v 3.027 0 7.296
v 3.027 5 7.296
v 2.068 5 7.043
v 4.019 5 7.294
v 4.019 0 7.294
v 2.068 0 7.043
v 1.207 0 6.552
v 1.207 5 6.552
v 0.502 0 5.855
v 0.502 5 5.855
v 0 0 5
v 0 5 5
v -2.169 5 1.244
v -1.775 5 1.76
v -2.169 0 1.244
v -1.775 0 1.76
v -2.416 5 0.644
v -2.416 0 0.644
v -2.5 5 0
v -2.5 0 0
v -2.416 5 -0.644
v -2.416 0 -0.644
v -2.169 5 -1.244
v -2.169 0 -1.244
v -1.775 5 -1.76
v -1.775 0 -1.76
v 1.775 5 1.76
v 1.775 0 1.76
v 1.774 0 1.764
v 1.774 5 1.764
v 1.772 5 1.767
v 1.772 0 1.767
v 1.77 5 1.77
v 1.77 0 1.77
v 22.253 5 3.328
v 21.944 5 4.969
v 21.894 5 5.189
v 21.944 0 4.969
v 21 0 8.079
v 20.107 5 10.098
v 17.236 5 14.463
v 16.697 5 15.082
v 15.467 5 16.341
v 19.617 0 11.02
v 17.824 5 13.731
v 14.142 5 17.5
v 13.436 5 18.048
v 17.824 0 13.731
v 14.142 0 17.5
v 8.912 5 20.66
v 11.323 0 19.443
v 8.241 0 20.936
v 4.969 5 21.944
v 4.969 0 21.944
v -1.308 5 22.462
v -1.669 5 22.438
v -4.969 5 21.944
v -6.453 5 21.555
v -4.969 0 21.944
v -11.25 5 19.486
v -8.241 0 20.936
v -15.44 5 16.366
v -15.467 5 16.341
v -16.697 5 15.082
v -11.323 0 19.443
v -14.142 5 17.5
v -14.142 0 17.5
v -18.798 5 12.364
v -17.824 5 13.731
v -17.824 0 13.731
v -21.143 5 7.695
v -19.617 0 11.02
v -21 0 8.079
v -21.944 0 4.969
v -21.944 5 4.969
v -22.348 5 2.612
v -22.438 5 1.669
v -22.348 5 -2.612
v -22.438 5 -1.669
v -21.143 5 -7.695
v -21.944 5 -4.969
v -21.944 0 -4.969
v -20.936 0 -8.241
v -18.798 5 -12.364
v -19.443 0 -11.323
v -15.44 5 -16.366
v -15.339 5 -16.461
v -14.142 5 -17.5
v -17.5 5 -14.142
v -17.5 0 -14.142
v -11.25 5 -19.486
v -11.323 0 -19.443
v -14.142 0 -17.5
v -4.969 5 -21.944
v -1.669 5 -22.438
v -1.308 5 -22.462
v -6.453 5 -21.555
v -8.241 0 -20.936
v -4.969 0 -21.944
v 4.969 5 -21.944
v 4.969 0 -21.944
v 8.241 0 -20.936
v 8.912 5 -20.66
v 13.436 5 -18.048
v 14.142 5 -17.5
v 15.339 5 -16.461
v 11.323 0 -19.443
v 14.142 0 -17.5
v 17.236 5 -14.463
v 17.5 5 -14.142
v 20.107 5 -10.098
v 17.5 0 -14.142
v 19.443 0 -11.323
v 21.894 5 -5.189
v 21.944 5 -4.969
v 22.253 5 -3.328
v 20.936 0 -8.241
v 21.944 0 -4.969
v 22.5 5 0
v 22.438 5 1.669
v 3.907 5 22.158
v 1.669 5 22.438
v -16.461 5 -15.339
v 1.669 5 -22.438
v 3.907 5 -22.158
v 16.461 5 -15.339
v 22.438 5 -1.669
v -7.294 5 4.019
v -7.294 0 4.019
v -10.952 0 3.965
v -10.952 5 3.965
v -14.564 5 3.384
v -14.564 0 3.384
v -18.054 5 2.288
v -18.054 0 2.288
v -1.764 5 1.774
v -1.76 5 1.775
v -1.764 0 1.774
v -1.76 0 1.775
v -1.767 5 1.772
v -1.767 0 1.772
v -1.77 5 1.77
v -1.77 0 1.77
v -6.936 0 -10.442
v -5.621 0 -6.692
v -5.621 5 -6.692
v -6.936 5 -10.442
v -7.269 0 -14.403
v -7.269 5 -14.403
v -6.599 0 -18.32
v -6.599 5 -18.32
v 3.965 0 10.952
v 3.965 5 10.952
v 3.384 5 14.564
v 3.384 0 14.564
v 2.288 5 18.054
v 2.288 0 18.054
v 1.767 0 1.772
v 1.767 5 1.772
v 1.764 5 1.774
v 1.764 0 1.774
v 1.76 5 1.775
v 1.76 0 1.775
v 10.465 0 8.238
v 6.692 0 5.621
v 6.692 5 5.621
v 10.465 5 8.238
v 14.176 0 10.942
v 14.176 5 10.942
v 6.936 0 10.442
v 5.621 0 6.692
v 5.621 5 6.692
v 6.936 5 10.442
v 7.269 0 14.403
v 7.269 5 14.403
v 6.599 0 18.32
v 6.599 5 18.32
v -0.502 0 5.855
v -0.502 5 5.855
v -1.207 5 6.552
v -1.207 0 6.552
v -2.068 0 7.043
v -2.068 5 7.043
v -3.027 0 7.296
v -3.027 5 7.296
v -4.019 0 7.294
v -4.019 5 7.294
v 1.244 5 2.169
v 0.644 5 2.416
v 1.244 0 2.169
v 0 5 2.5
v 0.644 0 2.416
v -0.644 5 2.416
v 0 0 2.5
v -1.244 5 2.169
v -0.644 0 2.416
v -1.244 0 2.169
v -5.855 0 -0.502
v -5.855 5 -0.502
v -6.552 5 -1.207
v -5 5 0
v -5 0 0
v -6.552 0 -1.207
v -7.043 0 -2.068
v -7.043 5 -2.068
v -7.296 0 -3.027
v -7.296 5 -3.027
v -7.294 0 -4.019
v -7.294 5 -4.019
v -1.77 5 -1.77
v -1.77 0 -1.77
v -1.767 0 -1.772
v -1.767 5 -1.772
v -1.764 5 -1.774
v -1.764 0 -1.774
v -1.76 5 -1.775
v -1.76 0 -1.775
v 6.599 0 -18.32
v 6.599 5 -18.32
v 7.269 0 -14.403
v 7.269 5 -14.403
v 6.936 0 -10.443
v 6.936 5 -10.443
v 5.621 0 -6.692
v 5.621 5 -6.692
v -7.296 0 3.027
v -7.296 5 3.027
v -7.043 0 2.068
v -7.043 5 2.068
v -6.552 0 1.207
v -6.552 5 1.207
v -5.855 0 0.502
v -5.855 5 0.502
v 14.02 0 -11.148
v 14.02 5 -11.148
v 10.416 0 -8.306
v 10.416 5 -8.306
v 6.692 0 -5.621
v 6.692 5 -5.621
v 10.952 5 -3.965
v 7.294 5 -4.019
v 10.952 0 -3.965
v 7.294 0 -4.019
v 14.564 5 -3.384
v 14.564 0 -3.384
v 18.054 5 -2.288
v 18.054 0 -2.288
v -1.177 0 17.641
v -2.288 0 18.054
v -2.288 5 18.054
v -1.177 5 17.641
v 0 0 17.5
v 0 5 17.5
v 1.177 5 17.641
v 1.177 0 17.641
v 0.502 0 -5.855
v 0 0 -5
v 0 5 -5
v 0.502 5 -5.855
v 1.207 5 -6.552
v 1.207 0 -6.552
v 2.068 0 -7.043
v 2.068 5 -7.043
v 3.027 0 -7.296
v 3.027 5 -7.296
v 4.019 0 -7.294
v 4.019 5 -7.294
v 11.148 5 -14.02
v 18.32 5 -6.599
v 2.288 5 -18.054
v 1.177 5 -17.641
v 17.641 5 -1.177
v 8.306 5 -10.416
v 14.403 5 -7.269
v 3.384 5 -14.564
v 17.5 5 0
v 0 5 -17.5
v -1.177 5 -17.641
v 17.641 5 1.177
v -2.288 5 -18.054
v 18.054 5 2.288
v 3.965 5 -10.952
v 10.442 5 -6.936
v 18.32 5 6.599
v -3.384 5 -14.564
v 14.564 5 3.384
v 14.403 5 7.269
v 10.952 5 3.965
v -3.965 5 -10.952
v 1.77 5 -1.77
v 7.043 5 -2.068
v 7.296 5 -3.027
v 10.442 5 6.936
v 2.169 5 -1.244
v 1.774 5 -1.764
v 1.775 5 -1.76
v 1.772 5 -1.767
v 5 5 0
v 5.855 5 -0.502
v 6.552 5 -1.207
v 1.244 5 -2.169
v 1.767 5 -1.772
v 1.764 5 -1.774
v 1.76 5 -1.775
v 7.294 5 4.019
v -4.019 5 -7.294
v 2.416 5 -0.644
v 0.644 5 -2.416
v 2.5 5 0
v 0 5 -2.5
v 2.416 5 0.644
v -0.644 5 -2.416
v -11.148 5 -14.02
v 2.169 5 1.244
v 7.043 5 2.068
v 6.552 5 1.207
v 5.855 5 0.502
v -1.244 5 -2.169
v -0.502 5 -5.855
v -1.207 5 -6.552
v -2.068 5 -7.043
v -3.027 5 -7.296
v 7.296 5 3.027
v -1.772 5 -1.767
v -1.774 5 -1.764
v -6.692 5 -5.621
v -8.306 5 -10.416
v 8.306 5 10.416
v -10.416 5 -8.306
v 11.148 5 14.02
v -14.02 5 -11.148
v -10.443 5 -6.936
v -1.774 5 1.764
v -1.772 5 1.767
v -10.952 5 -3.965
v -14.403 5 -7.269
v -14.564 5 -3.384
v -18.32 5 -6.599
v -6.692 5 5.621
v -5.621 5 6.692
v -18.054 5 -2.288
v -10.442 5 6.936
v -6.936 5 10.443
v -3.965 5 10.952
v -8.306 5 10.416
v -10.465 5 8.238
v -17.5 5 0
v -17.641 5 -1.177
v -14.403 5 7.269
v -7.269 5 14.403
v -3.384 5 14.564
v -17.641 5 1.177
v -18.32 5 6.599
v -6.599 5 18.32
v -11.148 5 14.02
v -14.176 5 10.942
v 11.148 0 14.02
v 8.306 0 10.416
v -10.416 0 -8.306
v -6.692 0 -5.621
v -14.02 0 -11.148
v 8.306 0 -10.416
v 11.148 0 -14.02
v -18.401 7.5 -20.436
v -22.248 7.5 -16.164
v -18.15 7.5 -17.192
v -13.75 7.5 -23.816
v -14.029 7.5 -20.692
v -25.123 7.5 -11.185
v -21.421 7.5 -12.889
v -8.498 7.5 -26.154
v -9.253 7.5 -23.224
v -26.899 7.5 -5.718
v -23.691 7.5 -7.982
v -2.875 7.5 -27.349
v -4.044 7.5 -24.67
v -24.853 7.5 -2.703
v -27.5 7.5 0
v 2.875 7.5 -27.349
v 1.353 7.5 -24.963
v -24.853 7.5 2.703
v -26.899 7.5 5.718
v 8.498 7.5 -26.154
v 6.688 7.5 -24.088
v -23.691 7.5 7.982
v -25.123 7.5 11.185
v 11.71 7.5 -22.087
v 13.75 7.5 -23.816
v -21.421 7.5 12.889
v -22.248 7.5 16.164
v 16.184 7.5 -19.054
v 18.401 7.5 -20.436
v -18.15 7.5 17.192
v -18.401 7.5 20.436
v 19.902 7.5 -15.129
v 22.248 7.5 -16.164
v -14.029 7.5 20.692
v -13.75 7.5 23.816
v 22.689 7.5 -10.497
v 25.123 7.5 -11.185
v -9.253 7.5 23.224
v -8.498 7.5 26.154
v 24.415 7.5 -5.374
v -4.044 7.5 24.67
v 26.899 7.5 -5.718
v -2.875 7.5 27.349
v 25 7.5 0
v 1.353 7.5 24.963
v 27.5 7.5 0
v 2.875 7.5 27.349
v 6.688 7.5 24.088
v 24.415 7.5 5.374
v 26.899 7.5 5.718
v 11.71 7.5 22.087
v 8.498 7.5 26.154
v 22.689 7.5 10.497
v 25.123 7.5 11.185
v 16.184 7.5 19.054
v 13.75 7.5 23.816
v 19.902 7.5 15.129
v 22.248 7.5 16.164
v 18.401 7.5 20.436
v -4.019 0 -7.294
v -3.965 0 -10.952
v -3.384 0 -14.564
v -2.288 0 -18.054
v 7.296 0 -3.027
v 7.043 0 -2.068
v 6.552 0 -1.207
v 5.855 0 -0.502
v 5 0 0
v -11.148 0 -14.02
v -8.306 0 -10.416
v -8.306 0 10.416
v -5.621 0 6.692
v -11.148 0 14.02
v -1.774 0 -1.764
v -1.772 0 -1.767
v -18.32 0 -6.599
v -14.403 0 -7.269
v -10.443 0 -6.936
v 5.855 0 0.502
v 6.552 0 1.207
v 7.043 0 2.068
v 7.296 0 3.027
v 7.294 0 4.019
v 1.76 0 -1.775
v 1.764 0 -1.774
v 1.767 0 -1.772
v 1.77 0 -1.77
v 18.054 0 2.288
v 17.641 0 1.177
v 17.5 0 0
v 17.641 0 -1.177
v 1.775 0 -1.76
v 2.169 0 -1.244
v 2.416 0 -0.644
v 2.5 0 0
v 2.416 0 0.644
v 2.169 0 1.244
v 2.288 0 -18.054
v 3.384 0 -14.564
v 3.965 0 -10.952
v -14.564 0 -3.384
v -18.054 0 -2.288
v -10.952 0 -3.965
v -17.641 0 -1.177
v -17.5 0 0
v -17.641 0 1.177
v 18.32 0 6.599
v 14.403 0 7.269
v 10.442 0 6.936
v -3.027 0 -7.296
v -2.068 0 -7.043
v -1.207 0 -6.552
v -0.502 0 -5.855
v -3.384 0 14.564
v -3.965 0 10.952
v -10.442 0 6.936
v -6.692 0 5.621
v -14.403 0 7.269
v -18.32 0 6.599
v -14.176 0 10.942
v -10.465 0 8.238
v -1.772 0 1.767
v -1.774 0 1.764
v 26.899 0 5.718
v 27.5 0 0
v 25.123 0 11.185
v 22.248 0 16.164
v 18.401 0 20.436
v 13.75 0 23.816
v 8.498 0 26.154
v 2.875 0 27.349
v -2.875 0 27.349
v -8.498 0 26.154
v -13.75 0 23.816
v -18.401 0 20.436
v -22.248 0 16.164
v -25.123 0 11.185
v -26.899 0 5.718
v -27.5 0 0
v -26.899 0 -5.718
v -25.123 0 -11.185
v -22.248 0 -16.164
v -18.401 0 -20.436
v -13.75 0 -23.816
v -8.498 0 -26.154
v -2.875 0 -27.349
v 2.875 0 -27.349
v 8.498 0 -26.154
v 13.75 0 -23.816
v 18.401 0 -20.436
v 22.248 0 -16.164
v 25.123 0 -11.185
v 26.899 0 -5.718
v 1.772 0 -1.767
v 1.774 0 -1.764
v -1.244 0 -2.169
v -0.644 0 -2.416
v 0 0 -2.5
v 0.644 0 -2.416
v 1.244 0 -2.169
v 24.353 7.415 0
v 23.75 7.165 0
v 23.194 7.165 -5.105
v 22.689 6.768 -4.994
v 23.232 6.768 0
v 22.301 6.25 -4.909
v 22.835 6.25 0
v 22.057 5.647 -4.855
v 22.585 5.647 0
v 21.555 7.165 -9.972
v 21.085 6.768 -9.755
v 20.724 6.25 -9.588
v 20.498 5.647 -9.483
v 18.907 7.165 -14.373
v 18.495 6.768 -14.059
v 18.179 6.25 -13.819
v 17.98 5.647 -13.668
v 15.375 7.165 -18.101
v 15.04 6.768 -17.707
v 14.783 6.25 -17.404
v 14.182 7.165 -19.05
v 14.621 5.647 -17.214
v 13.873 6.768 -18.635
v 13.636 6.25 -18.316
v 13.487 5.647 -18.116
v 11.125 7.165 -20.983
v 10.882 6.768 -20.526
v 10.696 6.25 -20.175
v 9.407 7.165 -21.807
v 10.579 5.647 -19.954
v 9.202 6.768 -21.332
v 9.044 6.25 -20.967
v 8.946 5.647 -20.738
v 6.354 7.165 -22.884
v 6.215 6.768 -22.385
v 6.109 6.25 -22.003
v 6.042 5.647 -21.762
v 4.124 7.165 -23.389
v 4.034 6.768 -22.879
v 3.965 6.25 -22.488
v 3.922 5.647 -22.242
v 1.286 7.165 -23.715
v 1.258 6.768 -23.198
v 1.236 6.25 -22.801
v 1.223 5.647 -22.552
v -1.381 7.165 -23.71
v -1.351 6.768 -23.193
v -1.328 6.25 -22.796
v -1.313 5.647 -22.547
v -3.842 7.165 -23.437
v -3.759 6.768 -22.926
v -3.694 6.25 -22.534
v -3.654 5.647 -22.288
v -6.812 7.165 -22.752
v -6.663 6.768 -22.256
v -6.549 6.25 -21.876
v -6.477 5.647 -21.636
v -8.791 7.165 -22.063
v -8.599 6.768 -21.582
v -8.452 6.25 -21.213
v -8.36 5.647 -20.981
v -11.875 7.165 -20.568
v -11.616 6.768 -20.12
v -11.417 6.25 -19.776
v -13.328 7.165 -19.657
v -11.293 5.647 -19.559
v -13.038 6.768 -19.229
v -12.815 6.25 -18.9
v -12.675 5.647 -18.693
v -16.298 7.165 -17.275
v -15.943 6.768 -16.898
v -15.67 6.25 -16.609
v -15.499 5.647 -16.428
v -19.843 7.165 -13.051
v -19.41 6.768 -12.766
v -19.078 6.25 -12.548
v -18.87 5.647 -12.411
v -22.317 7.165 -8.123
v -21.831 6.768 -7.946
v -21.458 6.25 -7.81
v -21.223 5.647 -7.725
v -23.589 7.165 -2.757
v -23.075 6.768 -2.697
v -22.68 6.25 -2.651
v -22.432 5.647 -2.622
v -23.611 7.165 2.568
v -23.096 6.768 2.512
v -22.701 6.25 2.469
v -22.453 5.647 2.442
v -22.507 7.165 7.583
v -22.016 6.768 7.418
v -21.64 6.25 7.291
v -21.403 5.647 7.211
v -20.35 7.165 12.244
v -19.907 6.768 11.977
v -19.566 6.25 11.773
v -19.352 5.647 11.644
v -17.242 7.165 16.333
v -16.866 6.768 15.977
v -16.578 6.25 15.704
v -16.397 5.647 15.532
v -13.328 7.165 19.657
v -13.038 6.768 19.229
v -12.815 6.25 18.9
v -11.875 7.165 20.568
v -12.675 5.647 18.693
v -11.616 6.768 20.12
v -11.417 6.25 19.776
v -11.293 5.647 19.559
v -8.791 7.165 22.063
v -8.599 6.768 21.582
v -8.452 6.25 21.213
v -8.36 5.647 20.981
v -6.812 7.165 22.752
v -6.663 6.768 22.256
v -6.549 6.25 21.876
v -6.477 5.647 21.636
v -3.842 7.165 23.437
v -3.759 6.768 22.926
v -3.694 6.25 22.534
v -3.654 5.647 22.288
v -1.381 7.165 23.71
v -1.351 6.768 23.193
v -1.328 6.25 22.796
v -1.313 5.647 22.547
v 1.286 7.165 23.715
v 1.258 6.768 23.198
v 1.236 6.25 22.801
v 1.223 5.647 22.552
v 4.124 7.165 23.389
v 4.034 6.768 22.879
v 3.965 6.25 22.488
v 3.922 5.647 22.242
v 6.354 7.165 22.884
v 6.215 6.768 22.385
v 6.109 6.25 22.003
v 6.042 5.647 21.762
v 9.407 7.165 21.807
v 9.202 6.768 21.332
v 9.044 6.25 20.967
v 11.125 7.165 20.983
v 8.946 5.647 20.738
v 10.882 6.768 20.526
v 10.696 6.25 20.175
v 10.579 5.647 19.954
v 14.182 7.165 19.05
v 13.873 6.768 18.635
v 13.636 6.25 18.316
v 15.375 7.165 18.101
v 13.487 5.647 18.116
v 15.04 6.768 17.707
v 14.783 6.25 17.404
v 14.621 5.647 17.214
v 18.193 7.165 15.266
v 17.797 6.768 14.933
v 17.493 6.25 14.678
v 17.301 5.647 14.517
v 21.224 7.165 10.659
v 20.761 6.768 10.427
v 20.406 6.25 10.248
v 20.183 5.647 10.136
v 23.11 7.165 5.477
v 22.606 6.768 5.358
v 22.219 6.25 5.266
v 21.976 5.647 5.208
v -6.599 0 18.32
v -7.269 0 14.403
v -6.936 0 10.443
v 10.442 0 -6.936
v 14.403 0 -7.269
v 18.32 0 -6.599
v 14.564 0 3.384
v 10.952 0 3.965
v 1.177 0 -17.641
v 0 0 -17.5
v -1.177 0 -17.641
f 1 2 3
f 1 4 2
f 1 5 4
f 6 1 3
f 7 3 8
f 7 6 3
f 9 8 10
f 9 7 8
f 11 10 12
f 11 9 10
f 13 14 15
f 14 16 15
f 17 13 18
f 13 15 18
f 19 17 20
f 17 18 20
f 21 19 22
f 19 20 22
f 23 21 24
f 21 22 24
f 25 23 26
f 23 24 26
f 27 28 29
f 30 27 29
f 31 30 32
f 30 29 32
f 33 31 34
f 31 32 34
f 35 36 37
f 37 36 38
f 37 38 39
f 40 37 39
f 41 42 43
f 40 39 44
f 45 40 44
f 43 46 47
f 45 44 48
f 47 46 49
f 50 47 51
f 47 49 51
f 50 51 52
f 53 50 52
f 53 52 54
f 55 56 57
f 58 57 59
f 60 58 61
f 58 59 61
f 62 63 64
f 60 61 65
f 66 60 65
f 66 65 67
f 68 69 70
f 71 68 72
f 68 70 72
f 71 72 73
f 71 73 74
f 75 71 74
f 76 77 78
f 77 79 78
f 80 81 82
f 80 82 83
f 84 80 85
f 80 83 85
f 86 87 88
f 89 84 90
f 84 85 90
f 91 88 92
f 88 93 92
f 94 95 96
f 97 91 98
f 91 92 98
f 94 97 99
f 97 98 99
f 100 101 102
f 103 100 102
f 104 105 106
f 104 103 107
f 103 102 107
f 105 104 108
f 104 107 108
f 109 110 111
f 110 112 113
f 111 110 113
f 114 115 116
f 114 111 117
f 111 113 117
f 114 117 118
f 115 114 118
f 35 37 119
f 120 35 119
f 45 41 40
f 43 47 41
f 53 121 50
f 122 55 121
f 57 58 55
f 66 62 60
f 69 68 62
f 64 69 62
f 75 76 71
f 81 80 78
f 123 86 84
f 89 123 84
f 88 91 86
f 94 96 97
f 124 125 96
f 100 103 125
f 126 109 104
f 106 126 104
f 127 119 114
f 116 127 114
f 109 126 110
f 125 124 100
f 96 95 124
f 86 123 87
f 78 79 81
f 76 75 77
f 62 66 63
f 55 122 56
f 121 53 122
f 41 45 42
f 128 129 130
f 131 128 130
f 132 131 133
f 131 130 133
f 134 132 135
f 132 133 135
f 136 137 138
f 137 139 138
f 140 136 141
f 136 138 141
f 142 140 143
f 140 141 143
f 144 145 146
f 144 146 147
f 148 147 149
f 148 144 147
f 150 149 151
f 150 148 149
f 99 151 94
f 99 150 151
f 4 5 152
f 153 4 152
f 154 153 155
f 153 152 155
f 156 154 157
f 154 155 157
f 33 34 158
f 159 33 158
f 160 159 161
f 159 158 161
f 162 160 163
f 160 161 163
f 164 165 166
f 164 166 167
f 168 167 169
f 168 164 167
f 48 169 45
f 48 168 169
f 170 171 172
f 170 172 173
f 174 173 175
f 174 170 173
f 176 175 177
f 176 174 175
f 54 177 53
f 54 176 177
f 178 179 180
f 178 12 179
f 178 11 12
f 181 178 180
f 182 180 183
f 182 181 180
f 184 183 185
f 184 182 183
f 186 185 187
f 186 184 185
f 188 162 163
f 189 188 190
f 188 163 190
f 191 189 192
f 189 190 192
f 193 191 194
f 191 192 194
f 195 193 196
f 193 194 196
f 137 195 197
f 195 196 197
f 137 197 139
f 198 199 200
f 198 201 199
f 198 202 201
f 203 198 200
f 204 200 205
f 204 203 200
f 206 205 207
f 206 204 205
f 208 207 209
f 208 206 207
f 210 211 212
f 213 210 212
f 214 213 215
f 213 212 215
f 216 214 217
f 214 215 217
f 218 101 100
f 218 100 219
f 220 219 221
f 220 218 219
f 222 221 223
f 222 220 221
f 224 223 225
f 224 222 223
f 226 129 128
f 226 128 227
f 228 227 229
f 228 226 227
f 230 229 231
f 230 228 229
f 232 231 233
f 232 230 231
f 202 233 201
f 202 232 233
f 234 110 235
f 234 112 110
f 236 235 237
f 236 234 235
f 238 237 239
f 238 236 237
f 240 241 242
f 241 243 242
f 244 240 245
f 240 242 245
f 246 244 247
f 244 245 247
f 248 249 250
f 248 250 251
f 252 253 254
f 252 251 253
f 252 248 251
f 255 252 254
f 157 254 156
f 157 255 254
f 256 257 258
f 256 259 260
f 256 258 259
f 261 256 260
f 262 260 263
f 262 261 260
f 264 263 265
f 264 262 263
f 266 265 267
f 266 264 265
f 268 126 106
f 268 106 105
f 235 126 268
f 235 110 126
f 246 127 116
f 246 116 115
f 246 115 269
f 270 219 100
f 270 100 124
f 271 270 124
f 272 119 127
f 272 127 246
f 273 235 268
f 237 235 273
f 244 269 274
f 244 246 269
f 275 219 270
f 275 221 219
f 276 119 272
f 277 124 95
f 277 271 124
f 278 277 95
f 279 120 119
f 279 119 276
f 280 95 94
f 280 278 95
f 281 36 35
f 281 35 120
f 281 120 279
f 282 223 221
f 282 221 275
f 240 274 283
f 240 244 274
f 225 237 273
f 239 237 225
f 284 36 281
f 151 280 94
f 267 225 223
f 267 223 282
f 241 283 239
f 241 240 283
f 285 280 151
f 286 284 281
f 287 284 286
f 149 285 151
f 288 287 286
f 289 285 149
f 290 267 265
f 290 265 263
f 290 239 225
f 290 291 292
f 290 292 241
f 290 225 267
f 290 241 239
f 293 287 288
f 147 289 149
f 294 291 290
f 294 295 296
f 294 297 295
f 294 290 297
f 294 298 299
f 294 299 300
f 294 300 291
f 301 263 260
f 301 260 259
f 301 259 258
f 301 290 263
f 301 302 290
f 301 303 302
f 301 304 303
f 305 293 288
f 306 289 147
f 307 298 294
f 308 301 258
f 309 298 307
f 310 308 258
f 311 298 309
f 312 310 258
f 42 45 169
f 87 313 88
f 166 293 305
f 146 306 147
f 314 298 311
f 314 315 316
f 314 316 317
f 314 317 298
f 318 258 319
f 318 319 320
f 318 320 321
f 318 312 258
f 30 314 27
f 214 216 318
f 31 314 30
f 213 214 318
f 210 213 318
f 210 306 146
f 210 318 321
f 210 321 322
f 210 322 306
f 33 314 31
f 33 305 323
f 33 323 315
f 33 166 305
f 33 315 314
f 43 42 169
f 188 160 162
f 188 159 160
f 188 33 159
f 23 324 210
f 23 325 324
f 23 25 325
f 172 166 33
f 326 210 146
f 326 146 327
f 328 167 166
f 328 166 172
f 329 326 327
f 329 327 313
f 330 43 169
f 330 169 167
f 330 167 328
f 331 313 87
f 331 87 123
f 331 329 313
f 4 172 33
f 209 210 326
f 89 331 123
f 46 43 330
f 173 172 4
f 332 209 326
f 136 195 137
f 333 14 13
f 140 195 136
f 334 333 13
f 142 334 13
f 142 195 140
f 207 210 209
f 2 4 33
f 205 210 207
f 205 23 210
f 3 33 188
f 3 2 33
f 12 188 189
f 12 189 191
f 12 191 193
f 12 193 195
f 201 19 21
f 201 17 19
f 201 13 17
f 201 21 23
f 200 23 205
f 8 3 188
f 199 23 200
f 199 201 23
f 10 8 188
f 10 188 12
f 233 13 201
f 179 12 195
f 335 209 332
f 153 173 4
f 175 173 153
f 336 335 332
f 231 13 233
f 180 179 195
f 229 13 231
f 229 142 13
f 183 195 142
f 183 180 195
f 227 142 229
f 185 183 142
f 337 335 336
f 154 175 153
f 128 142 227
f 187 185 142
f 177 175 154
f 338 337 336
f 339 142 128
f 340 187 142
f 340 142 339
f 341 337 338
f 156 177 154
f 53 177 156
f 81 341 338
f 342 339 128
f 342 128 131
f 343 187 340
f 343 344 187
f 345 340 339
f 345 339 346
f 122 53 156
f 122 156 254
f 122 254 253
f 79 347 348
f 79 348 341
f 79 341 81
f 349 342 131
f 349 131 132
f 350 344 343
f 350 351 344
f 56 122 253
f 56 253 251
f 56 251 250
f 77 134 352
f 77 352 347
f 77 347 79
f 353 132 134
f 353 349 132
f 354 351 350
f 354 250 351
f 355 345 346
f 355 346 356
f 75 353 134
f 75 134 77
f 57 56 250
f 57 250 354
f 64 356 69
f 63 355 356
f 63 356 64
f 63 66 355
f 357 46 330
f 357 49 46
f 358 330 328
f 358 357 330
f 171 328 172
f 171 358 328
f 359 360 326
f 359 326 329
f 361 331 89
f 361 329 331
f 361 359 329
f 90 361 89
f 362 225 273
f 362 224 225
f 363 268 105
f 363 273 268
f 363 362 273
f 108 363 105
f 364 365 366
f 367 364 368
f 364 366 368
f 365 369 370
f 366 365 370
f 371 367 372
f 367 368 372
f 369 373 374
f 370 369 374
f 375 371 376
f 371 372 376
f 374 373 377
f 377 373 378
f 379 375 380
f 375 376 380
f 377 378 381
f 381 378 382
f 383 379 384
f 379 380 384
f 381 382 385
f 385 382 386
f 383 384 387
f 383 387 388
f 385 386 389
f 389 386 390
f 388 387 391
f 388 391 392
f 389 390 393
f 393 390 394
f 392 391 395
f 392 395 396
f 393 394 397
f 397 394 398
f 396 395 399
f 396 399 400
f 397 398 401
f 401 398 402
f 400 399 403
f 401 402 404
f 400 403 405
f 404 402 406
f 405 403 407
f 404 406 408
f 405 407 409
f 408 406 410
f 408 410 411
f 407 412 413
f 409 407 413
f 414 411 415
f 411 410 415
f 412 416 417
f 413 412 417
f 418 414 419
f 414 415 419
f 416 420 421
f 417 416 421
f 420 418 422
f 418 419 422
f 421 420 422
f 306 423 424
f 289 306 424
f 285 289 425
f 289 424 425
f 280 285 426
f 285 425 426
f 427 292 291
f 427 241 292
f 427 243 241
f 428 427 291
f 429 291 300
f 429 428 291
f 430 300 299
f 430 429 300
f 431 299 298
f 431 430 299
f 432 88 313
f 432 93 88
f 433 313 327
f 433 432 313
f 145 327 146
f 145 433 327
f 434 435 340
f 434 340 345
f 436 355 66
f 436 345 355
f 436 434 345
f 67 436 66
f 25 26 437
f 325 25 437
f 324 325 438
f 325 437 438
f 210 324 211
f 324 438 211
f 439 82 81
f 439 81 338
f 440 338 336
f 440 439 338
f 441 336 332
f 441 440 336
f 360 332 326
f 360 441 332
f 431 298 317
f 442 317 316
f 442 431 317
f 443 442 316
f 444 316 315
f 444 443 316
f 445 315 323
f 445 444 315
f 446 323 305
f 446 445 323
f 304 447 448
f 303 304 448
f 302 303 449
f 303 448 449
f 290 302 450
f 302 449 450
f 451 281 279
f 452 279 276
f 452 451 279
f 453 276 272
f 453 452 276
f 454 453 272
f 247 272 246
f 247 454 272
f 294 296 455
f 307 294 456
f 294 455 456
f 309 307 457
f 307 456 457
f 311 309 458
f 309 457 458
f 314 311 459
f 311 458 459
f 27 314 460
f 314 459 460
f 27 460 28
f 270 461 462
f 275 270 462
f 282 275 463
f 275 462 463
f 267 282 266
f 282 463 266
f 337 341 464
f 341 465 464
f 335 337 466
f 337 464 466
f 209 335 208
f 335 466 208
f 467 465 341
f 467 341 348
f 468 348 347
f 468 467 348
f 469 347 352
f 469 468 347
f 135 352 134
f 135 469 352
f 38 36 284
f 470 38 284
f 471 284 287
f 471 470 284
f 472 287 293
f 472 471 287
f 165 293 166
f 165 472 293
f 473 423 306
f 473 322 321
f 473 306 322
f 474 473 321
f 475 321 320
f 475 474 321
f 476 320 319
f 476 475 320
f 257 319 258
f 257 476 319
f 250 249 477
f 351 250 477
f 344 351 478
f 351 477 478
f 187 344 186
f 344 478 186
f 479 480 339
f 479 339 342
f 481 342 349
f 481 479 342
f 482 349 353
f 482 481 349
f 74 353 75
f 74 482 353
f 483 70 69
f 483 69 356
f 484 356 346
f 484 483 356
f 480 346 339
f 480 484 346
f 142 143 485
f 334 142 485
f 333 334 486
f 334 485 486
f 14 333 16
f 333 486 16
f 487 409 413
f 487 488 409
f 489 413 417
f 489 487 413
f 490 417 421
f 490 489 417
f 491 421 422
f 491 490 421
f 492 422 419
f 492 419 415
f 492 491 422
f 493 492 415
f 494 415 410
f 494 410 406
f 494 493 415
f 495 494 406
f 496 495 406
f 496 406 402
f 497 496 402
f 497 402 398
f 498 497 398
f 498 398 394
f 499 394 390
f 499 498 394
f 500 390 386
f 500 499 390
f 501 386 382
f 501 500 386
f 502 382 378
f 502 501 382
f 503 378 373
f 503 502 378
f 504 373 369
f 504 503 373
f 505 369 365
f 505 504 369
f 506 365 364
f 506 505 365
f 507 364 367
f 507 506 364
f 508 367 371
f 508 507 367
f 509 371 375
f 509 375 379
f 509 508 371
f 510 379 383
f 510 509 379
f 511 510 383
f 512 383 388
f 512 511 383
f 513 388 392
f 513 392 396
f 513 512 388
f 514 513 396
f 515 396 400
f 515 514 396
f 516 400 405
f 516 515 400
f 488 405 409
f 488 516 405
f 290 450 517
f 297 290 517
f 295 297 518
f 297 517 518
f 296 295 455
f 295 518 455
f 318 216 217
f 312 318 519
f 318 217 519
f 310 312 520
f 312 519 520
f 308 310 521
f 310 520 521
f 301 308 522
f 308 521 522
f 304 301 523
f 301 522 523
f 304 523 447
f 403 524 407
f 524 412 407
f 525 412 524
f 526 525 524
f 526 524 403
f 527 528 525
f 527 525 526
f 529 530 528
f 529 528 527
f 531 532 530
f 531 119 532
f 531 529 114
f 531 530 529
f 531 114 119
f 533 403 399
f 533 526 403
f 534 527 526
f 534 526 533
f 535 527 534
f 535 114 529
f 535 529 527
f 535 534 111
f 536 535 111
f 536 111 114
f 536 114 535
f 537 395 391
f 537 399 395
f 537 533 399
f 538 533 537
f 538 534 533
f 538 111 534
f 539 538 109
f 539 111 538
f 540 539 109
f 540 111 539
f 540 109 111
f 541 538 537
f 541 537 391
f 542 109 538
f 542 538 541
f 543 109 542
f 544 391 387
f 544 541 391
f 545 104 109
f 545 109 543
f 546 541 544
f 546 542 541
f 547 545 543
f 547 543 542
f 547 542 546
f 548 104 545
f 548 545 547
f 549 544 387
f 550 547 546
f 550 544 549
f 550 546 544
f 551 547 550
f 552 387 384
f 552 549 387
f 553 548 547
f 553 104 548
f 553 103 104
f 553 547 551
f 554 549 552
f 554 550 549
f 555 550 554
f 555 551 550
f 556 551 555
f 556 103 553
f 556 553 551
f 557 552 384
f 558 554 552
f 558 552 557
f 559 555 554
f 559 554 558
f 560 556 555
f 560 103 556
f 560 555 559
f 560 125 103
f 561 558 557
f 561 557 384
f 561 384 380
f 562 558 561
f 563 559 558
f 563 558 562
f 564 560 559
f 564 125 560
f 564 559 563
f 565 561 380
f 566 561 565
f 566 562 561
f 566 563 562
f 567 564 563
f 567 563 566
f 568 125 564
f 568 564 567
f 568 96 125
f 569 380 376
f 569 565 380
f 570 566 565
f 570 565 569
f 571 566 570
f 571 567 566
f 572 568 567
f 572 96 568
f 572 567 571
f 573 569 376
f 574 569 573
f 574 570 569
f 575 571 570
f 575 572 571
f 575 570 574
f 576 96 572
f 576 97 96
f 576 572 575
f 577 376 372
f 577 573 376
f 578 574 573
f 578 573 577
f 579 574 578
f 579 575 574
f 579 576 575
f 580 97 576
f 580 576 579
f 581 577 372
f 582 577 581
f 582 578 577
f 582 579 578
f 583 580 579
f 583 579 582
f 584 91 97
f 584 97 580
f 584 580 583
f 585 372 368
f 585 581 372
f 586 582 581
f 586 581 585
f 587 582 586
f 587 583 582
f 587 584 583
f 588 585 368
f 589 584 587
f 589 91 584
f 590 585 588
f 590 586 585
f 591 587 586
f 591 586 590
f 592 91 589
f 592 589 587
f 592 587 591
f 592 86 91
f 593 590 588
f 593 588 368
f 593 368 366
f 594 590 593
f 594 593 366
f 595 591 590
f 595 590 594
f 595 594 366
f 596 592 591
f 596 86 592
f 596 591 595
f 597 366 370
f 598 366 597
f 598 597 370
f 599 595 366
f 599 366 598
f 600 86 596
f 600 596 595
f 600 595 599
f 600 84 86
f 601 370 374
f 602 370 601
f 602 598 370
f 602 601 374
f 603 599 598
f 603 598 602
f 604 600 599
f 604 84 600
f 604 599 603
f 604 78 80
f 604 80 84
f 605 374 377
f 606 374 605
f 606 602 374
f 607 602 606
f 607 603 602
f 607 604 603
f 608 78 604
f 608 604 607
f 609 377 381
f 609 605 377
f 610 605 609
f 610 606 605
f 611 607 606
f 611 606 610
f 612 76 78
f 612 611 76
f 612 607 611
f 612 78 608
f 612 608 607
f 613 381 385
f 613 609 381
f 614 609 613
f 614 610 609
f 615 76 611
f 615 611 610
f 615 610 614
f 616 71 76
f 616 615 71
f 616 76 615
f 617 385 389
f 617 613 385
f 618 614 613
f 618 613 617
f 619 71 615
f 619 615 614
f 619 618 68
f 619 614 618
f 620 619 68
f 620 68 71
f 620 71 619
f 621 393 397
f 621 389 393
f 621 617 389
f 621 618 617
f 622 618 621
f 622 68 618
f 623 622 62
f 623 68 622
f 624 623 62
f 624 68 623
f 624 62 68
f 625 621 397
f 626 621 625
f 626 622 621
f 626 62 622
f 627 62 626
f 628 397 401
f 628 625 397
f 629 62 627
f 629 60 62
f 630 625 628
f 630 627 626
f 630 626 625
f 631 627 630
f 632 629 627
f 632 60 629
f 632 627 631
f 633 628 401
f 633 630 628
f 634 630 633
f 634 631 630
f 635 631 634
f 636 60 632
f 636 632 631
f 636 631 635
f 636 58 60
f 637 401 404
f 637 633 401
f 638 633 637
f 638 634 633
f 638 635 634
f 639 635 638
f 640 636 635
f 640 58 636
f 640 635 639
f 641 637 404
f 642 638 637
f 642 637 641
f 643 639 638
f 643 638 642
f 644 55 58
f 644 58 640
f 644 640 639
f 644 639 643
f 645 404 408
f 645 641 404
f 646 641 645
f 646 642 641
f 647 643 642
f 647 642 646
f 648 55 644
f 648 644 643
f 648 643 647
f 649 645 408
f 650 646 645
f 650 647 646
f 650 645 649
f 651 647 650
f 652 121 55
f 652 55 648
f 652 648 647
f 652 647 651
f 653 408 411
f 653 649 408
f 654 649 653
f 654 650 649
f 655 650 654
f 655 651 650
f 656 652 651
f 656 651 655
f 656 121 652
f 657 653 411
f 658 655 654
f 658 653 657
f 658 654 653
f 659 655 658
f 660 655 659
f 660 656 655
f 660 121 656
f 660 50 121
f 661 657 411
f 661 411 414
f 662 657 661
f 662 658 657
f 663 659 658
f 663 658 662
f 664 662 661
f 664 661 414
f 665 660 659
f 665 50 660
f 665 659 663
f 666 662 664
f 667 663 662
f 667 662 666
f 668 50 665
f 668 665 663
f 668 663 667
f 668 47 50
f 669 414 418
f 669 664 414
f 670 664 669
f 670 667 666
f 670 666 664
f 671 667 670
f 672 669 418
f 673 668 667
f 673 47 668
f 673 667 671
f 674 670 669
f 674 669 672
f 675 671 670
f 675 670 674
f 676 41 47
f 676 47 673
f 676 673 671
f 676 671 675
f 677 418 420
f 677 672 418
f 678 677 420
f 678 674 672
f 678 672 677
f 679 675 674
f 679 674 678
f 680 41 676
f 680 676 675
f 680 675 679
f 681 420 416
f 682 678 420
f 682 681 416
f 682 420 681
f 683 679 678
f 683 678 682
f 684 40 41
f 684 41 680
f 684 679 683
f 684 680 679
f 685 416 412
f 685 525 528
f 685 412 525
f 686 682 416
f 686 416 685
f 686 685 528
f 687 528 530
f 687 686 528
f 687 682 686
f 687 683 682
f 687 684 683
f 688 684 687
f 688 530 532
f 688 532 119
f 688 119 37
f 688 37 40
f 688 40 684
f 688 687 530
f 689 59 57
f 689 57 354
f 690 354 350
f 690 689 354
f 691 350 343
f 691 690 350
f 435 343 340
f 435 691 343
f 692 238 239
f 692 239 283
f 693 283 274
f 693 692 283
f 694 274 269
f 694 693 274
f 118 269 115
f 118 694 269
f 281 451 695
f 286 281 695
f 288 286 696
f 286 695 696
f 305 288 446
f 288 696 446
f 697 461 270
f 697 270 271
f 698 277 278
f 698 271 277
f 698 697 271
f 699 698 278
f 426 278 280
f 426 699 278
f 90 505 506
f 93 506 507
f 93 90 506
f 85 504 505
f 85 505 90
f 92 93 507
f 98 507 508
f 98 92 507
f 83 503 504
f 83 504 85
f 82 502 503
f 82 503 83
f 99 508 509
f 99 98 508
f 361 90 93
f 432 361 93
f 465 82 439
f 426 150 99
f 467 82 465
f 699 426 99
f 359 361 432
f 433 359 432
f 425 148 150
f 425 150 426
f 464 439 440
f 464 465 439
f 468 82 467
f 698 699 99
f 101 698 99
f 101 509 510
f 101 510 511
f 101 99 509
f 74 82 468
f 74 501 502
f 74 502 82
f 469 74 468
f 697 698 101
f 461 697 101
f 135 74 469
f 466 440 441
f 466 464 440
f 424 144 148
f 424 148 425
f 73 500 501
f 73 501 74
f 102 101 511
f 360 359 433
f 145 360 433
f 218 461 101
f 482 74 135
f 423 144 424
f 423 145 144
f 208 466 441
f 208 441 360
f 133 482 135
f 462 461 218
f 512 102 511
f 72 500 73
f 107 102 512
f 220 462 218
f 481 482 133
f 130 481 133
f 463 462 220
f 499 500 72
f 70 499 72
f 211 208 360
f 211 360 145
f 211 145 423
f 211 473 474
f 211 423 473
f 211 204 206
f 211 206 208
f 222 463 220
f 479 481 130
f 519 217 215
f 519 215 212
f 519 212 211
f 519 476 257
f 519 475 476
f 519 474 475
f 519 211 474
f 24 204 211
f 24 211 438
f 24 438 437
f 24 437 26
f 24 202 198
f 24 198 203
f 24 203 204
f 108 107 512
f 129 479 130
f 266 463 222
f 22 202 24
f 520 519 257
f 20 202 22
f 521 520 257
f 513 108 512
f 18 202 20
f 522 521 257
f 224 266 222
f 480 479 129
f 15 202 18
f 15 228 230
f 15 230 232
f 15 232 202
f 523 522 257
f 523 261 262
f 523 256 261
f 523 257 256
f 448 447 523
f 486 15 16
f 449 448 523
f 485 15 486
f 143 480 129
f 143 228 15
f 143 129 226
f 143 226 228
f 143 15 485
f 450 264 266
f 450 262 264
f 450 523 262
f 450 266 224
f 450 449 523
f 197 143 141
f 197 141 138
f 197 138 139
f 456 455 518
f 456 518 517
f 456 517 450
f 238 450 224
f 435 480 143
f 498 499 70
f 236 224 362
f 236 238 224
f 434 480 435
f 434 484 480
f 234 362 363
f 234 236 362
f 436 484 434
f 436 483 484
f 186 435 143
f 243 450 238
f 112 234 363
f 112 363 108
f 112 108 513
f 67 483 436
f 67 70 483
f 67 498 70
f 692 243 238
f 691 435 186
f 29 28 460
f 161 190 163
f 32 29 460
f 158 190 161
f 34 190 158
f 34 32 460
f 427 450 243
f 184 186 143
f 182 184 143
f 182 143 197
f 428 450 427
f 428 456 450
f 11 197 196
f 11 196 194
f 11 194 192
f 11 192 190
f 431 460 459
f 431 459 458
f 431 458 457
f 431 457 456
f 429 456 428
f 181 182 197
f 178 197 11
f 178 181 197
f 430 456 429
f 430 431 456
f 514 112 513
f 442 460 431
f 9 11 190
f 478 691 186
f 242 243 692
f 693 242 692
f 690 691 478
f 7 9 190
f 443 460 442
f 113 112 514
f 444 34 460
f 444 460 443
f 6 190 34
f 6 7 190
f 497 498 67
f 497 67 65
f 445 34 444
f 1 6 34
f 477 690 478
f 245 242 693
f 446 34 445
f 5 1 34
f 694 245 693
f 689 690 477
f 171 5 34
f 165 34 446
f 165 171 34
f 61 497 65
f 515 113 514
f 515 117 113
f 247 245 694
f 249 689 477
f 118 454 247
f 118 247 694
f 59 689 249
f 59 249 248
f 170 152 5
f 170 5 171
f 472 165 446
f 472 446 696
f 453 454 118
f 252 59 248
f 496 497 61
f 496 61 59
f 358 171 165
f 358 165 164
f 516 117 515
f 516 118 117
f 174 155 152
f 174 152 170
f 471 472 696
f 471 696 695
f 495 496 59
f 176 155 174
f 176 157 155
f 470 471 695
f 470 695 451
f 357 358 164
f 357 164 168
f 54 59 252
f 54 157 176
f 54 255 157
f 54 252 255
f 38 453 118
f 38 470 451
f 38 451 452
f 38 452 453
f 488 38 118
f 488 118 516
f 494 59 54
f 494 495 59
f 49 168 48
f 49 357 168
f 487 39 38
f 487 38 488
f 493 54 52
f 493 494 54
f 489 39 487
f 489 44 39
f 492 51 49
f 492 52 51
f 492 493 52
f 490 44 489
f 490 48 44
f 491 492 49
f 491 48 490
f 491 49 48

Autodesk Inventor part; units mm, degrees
ref_plane "YZ Plane" through (0, 0, 0) normal (1, 0, 0) x (0, 1, 0)
ref_plane "XZ Plane" through (0, 0, 0) normal (0, 1, 0) x (-1, 0, 0)
ref_plane "XY Plane" through (0, 0, 0) normal (0, 0, 1) x (1, 0, 0)
sketch "Sketch1" plane through (0, 0, 0) normal (0, 1, 0) x (-1, 0, 0)
  circle A0 centre (0, 0) radius 2.5
  circle A1 centre (0, 0) radius 5
  circle A2 centre (0, 0) radius 22.5
  circle A3 centre (0, 0) radius 27.5
  arc A4 (0, 5) -> (0, -22.5) centre (21.25, -8.75) ccw
  arc A5 (0, -22.5) -> (0, 5) centre (-21.25, -8.75) ccw
  arc A6 (-5, 0) -> (22.5, 0) centre (8.75, 21.25) ccw
  arc A7 (22.5, 0) -> (-5, 0) centre (8.75, -21.25) ccw
  arc A8 (0, -5) -> (0, 22.5) centre (-21.25, 8.75) ccw
  arc A9 (0, 22.5) -> (0, -5) centre (21.25, 8.75) ccw
  arc A10 (5, 0) -> (-22.5, 0) centre (-8.75, -21.25) ccw
  arc A11 (-22.5, 0) -> (5, 0) centre (-8.75, 21.25) ccw
  circle A12 centre (-22.5, 0) radius 5
  circle A13 centre (0, -22.5) radius 5
  circle A14 centre (22.5, 0) radius 5
  circle A15 centre (0, 22.5) radius 5
  arc A16 (-4.969, 21.9444) -> (-1.7705, 1.7705) centre (8.4478, 13.7311) ccw
  arc A17 (1.7705, 1.7705) -> (4.969, 21.9444) centre (-8.4478, 13.7311) ccw
  arc A18 (4.969, -21.9444) -> (1.7705, -1.7705) centre (-8.4478, -13.7311) ccw
  arc A19 (-1.7705, -1.7705) -> (-4.969, -21.9444) centre (8.4478, -13.7311) ccw
  arc A20 (21.9444, 4.969) -> (1.7705, 1.7705) centre (13.7311, -8.4478) ccw
  arc A21 (1.7705, -1.7705) -> (21.9444, -4.969) centre (13.7311, 8.4478) ccw
  arc A22 (-1.7705, 1.7705) -> (-21.9444, 4.969) centre (-13.7311, -8.4478) ccw
  arc A23 (-21.9444, -4.969) -> (-1.7705, -1.7705) centre (-13.7311, 8.4478) ccw
  circle A24 centre (-3.5128, 3.5128) radius 3.8147
  circle A25 centre (-3.5128, -3.5128) radius 3.8147
  circle A26 centre (3.5128, -3.5128) radius 3.8147
  circle A27 centre (3.5128, 3.5128) radius 3.8147
  arc A28 (-3.5128, -3.5128) -> (-17.5, -14.1421) centre (54.0041, -93.7172) ccw
  arc A29 (-14.1421, -17.5) -> (-3.5128, -3.5128) centre (-93.7172, 54.0041) ccw
  arc A30 (17.5, -14.1421) -> (3.5128, -3.5128) centre (-54.0041, -93.7172) ccw
  arc A31 (3.5128, -3.5128) -> (14.1421, -17.5) centre (93.7172, 54.0041) ccw
  arc A32 (3.5128, 3.5128) -> (17.8243, 13.7311) centre (-104.907, 170.494) ccw
  arc A33 (14.1421, 17.5) -> (3.5128, 3.5128) centre (93.7172, -54.0041) ccw
  arc A34 (-3.5128, 3.5128) -> (-14.1421, 17.5) centre (-93.7172, -54.0041) ccw
  arc A35 (-17.8243, 13.7311) -> (-3.5128, 3.5128) centre (104.907, 170.494) ccw
  point P0 (3.5128, -3.5128)
  point P1 (3.5503, -3.5207)
  point P2 (3.5207, -3.5503)
  point P3 (7.2938, 4.0186)
  point P4 (18.0544, 2.2883)
  point P5 (18.0544, -2.2883)
  point P6 (7.2938, -4.0186)
  point P7 (-3.5128, -3.5128)
  point P8 (-3.5207, -3.5503)
  point P9 (-3.5503, -3.5207)
  point P10 (-18.0544, 2.2883)
  point P11 (-7.2938, 4.0186)
  point P12 (-7.2938, -4.0186)
  point P13 (-18.0544, -2.2883)
  point P14 (-1.7751, -1.7604)
  point P15 (-1.7751, 1.7604)
  point P16 (-1.7604, 1.7751)
  point P17 (1.7604, 1.7751)
  point P18 (1.7751, 1.7604)
  point P19 (1.7751, -1.7604)
  point P20 (1.7604, -1.7751)
  point P21 (-1.7604, -1.7751)
  point P22 (2.2883, 18.0544)
  point P23 (4.0186, 7.2938)
  point P24 (0, 5)
  point P25 (-4.0186, 7.2938)
  point P26 (-2.2883, 18.0544)
  point P27 (4.0186, -7.2938)
  point P28 (2.2883, -18.0544)
  point P29 (-2.2883, -18.0544)
  point P30 (-4.0186, -7.2938)
  point P31 (-6.6922, -5.6207)
  point P32 (-5.6207, -6.6922)
  point P33 (5.6207, -6.6922)
  point P34 (6.6922, -5.6207)
  point P35 (6.6922, 5.6207)
  point P36 (5.6207, 6.6922)
  point P37 (-5.6207, 6.6922)
  point P38 (-6.6922, 5.6207)
  dimension "d2" = 45
  dimension "d0" = 5
  dimension "d1" = 10
  dimension "d3" = 55
extrude "Extrusion1" add sketch "Sketch1" along normal blind 5 contours A5 A27 A0 | A8 A26 A27 A5 | A0 A26 A8 | A0 A5 A10 A8 A26 | A27 A5 A11 A8 A0 | A27 A11 A5 | A8 A10 A26 | A11 A1 A6 A5 | A5 A18 A11 | A10 A8 A7 A1 | A26 A6 A1 | A1 A7 A27 | A10 A17 A8 | A0 A24 A7 A5 A10 | A20 A17 | A5 A7 A20 | A11 A8 A6 A25 A0 | A21 A6 A8 | A18 A21 | A31 A1 A5 | A5 A1 A8 A6 | A21 A1 A18 | A30 A1 A21 | A6 A1 A30 | A18 A1 A31 | A7 A32 A1 | A1 A32 A27 A7 | A6 A26 A30 A1 | A7 A5 A1 A8 | A33 A1 A17 | A17 A1 A20 | A20 A1 A32 | A8 A1 A33 | A0 A7 A24 | A7 A24 A5 | A25 A6 A0 | A8 A25 A6 | A5 A26 A1 | A1 A31 A26 A5 | A18 A31 A1 | A1 A21 A26 A18 | A1 A30 A21 | A1 A20 A32 | A27 A20 A14 A7 | A6 A14 A21 A26 | A8 A27 A33 A1 | A1 A27 A8 | A17 A27 A20 A1 | A1 A33 A17 | A10 A27 A24 A7 | A0 A27 A10 | A4 A10 A9 A1 | A27 A10 A4 | A1 A9 A24 | A11 A26 A0 | A6 A25 A26 A11 | A25 A4 A1 | A1 A4 A11 A9 | A9 A11 A26 | A26 A18 A13 A5 | A26 A30 A2 A31 | A27 A33 A2 A32 | A14 A2 A7 | A7 A6 A14 | A6 A2 A14 | A0 A26 A11 A9 A6 | A7 A4 A10 A27 A0 | A8 A15 A17 A27 | A9 A34 A1 | A1 A34 A24 A9 | A4 A22 A10 | A24 A16 A15 A9 | A4 A25 A29 A1 | A1 A29 A4 | A11 A23 A9 | A4 A13 A19 A25 | A13 A2 A5 | A5 A4 A13 | A9 A25 A0 | A0 A24 A4 | A4 A24 A25 A9 | A9 A6 A4 A24 A0 | A0 A25 A9 A7 A4 | A19 A4 A6 | A23 A19 | A7 A9 A16 | A16 A22 | A15 A9 A8 | A8 A2 A15 | A34 A16 A1 | A1 A16 A34 | A9 A7 A1 A10 | A22 A1 A16 | A35 A1 A22 | A10 A1 A35 | A15 A2 A9 | A16 A1 A22 A24 | A24 A35 A2 A34 | A29 A19 A1 | A1 A19 A29 | A11 A1 A6 A4 | A28 A1 A11 | A19 A1 A23 | A23 A1 A28 | A4 A2 A13 | A25 A23 A1 A19 | A29 A2 A28 A25 | A4 A6 A24 | A25 A7 A9 | A10 A24 A35 A1 | A1 A24 A10 | A1 A35 A22 | A24 A10 A12 A22 | A11 A25 A1 | A1 A28 A25 A11 | A23 A28 A1 | A23 A12 A11 A25 | A12 A10 A2 | A2 A11 A12 | A12 A11 A10 picked at (3.6592, 0.0793) picked at (-0.0899, 3.8712) picked at (-0.0899, -3.8712) picked at (-3.6592, -0.0793)
sketch "Sketch2" plane through (0, 0, 0) normal (0, -1, 0) x (1, 0, 0)
  circle A0 centre (0, 0) radius 22.5
  circle A1 centre (0, 0) radius 27.5
  dimension "d6" = 55
extrude "Extrusion2" add sketch "Sketch2" against normal blind 7.5
fillet "Fillet1" radius 2.5 1 edges at (-22.5, 7.5, 0)
properties part number "Hjul_Rev1"
